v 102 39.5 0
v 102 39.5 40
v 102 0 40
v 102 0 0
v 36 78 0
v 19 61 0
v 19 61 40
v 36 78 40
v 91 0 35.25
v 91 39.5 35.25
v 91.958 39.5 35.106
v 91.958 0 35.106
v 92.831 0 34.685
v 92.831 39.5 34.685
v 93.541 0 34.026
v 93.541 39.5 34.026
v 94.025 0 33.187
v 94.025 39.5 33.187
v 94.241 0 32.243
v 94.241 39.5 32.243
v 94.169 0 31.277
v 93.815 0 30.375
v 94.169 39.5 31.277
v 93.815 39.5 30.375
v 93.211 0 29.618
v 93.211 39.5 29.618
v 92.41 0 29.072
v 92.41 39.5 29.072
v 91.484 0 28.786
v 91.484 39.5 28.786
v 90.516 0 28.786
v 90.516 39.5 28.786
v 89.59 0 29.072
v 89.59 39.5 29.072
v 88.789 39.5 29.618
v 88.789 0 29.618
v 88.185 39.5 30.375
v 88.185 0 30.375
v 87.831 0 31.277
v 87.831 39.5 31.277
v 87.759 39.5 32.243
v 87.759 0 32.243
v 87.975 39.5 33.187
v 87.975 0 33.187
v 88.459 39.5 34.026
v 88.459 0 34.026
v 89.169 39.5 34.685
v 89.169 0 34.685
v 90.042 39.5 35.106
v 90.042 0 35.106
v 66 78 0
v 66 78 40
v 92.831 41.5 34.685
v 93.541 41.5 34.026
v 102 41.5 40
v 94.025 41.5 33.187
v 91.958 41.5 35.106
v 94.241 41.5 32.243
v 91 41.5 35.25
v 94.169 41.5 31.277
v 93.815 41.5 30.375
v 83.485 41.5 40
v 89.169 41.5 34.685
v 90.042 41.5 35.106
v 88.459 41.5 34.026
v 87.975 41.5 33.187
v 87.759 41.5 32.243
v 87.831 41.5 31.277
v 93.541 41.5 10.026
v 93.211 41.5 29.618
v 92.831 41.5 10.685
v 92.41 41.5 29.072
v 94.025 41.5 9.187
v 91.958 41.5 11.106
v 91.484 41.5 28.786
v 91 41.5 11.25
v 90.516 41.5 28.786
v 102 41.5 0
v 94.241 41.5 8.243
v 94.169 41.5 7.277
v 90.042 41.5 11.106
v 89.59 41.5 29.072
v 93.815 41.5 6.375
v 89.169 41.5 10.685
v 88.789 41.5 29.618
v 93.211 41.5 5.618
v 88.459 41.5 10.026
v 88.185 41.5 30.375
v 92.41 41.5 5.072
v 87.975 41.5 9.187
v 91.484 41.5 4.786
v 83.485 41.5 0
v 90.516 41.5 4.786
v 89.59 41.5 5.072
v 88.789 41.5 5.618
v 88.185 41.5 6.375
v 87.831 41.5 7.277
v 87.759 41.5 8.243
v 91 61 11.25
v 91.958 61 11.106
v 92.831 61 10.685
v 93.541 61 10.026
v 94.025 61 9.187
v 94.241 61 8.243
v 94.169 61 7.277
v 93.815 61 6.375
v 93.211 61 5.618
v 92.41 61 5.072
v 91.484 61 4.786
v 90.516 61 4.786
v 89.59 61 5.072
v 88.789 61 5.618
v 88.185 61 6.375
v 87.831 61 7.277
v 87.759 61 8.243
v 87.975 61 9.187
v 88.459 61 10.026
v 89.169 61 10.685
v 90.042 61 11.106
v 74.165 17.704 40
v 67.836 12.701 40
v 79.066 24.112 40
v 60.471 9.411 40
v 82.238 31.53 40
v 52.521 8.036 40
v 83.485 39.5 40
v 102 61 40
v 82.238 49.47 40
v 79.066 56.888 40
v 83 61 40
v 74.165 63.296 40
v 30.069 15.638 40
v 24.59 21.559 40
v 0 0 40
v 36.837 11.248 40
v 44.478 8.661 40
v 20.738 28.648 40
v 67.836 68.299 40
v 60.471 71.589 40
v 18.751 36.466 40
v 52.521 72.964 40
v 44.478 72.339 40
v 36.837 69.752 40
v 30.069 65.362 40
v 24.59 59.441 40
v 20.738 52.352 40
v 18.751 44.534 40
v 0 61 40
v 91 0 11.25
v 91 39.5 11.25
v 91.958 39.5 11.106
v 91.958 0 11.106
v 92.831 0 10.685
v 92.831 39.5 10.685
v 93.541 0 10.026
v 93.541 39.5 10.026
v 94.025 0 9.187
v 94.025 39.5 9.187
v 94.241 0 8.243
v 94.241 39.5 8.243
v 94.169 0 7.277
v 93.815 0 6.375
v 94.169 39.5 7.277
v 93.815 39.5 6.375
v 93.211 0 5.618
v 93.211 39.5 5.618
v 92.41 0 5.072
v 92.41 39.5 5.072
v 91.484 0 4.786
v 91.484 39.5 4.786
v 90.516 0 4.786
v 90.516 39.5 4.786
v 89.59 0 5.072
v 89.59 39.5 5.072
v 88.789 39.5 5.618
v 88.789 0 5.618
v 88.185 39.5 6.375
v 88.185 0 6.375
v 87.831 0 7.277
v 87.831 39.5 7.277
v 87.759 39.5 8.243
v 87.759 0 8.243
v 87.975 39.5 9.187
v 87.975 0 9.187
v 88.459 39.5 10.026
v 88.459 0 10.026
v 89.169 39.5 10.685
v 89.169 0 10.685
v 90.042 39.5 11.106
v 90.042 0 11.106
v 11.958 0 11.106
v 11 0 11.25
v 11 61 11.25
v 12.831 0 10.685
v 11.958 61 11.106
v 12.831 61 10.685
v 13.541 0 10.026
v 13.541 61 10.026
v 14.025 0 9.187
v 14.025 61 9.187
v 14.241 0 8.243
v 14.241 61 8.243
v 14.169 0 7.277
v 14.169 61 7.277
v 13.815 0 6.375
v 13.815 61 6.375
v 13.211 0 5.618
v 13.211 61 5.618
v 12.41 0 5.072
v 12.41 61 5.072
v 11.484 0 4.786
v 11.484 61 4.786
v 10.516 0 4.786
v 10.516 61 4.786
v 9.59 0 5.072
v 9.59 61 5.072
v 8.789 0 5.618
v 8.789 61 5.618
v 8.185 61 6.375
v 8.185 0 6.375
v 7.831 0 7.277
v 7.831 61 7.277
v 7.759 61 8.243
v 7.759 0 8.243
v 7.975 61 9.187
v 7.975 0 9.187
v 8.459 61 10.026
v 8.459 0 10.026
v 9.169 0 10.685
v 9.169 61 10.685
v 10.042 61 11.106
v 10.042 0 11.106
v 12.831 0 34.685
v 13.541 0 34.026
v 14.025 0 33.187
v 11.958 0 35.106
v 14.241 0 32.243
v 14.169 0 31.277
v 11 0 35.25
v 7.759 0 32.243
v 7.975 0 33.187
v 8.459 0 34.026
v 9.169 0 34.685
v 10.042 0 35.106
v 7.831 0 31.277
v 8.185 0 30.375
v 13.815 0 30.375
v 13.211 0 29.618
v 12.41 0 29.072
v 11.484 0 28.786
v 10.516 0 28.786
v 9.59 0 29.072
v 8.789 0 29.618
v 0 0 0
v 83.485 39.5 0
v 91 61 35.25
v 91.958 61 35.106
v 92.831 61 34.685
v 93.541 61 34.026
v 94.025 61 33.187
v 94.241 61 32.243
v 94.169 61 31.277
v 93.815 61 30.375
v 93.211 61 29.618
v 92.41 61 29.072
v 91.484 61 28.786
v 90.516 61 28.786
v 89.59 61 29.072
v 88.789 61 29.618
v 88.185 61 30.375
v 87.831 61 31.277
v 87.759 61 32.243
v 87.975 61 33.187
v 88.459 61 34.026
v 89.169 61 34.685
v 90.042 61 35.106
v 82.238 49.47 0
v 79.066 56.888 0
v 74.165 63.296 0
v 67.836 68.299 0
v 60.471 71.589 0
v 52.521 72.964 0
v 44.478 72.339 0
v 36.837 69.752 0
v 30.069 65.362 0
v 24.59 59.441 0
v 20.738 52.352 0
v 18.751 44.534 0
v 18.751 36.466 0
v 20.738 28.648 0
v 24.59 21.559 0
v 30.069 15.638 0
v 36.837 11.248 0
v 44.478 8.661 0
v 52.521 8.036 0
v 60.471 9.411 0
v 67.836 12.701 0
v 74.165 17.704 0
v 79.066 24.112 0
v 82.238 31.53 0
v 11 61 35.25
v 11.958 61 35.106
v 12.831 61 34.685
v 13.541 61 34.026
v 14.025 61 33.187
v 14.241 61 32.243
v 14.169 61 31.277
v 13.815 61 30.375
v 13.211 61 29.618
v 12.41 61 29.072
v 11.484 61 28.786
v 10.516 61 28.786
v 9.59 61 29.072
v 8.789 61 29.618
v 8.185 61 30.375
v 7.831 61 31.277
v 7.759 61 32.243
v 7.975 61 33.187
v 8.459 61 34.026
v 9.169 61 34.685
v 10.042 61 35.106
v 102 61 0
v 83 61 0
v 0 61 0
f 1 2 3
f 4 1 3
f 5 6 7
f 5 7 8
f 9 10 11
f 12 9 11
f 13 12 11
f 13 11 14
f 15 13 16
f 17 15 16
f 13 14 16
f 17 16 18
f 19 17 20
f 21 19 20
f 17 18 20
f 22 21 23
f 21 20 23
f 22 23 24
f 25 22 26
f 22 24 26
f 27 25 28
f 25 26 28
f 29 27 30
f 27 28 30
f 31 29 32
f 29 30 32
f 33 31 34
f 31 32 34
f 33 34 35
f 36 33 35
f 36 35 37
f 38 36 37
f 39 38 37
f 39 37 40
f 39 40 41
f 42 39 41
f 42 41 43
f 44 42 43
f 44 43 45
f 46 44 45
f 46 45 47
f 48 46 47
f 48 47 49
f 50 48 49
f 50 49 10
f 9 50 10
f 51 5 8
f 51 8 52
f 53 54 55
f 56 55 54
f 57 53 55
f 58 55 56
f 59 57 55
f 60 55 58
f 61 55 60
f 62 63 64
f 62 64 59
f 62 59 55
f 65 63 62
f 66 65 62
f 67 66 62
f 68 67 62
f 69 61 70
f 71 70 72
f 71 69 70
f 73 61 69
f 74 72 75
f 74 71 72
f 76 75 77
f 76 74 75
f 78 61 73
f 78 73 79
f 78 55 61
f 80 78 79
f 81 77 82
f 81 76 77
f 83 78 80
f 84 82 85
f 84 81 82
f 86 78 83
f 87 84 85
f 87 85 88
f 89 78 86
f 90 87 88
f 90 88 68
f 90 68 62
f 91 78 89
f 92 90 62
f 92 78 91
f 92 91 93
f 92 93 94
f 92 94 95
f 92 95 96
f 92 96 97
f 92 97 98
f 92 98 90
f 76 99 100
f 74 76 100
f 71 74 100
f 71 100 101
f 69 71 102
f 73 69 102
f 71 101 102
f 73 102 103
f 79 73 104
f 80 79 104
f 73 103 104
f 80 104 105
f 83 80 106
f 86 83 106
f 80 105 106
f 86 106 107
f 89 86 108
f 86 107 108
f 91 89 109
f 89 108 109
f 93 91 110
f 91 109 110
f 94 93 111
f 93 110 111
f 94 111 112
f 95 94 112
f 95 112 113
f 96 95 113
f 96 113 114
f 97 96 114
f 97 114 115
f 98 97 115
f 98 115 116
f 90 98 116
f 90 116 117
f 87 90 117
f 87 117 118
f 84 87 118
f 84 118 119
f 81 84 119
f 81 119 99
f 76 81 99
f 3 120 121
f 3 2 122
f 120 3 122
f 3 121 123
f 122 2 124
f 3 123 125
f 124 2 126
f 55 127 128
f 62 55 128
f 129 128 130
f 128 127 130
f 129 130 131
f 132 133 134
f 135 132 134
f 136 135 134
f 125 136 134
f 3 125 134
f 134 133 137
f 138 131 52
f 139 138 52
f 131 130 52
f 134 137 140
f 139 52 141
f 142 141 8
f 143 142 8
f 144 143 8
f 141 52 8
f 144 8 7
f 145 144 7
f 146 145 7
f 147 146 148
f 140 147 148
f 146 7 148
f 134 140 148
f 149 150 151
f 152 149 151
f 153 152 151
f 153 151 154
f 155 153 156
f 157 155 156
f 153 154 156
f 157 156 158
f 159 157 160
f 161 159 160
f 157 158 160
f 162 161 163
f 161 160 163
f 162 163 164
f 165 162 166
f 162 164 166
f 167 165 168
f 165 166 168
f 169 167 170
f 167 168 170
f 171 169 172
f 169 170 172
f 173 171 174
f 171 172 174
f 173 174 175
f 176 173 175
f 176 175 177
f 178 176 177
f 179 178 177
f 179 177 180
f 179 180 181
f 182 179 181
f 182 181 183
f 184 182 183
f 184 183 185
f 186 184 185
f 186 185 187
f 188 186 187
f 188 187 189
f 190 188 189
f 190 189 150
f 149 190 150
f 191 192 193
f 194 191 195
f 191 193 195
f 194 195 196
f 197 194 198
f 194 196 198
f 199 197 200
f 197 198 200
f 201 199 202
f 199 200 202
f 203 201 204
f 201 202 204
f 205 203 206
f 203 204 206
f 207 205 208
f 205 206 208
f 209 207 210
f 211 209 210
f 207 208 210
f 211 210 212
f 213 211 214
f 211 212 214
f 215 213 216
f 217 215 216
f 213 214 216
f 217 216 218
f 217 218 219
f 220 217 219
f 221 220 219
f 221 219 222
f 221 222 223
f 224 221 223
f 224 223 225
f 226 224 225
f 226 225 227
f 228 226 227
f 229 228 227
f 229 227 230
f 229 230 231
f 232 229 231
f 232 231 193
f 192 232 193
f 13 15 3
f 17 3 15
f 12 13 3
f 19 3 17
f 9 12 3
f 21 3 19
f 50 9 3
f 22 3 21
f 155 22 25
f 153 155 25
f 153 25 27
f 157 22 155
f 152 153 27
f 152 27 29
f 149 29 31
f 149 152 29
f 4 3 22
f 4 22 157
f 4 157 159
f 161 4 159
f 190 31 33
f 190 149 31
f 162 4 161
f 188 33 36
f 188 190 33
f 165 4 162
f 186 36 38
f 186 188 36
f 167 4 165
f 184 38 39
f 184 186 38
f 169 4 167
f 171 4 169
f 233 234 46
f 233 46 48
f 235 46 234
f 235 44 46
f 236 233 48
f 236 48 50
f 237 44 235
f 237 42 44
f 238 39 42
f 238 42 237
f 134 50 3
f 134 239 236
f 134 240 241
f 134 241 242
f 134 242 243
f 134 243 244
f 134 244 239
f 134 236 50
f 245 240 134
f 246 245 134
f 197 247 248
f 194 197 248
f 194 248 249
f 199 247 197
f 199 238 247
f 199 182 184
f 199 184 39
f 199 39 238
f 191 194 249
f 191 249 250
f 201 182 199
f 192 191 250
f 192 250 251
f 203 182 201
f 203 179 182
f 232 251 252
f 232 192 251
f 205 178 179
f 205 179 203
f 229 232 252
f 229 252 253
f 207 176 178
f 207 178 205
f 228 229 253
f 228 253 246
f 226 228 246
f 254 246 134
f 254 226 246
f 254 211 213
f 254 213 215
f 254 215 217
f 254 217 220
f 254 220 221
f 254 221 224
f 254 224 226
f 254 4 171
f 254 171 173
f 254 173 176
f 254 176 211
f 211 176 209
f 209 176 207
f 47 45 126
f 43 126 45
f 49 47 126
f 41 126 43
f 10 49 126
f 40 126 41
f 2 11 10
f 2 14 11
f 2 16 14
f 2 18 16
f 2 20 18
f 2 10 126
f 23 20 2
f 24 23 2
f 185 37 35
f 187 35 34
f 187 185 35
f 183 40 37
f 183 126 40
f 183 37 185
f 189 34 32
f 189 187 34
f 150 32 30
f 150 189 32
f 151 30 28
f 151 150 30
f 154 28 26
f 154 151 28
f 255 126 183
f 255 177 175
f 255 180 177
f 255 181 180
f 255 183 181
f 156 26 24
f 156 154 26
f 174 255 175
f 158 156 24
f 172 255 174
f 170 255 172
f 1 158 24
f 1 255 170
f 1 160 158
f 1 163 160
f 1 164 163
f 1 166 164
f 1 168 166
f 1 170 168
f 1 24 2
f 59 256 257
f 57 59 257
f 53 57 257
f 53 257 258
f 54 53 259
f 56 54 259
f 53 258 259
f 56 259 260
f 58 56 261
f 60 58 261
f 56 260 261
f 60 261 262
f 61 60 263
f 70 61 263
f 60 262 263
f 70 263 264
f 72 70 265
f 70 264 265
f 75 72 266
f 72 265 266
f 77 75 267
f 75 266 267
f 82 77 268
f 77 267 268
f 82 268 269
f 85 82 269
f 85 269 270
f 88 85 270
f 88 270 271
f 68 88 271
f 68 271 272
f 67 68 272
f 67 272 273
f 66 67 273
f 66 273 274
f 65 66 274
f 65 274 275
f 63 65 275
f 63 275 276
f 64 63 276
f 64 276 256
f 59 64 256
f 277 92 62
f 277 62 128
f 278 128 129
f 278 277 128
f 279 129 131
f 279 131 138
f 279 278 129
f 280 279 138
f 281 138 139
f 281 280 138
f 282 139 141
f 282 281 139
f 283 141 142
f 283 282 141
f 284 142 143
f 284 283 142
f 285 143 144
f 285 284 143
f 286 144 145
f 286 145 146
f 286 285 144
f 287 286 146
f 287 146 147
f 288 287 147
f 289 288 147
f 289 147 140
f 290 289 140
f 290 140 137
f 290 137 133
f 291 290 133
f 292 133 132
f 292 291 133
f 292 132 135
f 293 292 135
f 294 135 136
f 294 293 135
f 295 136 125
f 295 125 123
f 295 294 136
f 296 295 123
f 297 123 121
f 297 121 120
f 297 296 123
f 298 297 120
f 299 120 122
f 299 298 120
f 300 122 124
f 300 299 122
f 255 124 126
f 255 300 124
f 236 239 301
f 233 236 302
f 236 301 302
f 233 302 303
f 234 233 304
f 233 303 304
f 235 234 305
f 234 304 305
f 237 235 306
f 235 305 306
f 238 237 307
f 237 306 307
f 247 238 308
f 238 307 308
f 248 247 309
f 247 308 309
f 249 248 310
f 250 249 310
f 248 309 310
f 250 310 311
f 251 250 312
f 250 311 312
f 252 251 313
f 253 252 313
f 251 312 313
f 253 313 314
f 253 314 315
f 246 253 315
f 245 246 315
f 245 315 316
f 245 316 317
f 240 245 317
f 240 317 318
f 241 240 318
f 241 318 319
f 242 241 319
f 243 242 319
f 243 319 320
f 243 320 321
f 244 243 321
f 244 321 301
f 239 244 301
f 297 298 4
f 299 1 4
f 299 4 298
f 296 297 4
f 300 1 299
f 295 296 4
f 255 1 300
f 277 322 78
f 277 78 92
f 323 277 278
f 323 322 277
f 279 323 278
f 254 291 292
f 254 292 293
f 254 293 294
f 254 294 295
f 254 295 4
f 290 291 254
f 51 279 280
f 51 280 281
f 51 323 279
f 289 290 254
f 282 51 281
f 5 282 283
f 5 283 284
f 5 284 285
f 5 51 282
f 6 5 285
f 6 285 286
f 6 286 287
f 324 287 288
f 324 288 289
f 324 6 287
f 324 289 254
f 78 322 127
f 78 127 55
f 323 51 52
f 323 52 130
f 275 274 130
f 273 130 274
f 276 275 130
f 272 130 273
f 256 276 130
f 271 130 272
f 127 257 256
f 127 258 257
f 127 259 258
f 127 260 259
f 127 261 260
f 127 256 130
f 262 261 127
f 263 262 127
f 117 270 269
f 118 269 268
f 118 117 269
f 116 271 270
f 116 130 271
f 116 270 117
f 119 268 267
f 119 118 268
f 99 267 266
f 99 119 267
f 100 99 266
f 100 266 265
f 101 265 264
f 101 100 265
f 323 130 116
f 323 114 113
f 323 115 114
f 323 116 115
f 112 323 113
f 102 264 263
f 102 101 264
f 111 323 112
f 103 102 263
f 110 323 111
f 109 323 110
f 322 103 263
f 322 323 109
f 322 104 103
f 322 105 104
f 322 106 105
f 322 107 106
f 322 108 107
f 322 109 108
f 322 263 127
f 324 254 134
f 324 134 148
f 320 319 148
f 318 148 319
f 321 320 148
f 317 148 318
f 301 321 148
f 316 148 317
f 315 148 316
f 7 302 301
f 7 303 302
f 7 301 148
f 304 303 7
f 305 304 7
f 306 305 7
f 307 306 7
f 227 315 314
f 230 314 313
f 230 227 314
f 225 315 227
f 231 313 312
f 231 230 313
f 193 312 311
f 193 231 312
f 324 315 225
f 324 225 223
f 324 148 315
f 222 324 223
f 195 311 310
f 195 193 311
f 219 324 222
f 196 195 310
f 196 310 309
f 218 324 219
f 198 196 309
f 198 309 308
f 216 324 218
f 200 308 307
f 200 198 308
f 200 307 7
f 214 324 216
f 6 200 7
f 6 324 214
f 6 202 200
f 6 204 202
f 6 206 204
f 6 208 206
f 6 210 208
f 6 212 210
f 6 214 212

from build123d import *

# Parameters (mm, degrees)
EXTRUDE_1_DEPTH     = 40
SKETCH_2_R          = 3.25
CUT_EXTRUDE_1_DEPTH = 126.39936204


with BuildPart() as part:
    # 草图1 → 凸台-拉伸1 (new body)
    with BuildSketch(Plane.XY):
        with BuildLine():
            Line((0, 61), (19, 61))
            Line((19, 61), (36, 78))
            Line((36, 78), (66, 78))
            Line((66, 78), (83, 61))
            Line((83, 61), (102, 61))
            Line((102, 61), (102, 41.5))
            Line((102, 41.5), (83.484611742, 41.5))
            ThreePointArc((83.484611742, 41.5), (18.5, 40.5), (83.484611742, 39.5))
            Line((83.484611742, 39.5), (102, 39.5))
            Line((102, 39.5), (102, 0))
            Line((102, 0), (0, 0))
            Line((0, 0), (0, 61))
        make_face()
    extrude(amount=EXTRUDE_1_DEPTH)

    # 草图2 → 切除-拉伸1 (cut, through all)
    with BuildSketch(Plane(origin=(0, 61, 0), x_dir=(1, 0, 0), z_dir=(0, 1, 0))):
        with Locations(Location((11, -8, 0), (0, 0, 270))):
            Circle(SKETCH_2_R)
        with Locations(Location((11, -32, 0), (0, 0, 270))):
            Circle(SKETCH_2_R)
        with Locations(Location((91, -8, 0), (0, 0, 270))):
            Circle(SKETCH_2_R)
        with Locations(Location((91, -32, 0), (0, 0, 270))):
            Circle(SKETCH_2_R)
    extrude(amount=-CUT_EXTRUDE_1_DEPTH, mode=Mode.SUBTRACT)


solid = part.part
